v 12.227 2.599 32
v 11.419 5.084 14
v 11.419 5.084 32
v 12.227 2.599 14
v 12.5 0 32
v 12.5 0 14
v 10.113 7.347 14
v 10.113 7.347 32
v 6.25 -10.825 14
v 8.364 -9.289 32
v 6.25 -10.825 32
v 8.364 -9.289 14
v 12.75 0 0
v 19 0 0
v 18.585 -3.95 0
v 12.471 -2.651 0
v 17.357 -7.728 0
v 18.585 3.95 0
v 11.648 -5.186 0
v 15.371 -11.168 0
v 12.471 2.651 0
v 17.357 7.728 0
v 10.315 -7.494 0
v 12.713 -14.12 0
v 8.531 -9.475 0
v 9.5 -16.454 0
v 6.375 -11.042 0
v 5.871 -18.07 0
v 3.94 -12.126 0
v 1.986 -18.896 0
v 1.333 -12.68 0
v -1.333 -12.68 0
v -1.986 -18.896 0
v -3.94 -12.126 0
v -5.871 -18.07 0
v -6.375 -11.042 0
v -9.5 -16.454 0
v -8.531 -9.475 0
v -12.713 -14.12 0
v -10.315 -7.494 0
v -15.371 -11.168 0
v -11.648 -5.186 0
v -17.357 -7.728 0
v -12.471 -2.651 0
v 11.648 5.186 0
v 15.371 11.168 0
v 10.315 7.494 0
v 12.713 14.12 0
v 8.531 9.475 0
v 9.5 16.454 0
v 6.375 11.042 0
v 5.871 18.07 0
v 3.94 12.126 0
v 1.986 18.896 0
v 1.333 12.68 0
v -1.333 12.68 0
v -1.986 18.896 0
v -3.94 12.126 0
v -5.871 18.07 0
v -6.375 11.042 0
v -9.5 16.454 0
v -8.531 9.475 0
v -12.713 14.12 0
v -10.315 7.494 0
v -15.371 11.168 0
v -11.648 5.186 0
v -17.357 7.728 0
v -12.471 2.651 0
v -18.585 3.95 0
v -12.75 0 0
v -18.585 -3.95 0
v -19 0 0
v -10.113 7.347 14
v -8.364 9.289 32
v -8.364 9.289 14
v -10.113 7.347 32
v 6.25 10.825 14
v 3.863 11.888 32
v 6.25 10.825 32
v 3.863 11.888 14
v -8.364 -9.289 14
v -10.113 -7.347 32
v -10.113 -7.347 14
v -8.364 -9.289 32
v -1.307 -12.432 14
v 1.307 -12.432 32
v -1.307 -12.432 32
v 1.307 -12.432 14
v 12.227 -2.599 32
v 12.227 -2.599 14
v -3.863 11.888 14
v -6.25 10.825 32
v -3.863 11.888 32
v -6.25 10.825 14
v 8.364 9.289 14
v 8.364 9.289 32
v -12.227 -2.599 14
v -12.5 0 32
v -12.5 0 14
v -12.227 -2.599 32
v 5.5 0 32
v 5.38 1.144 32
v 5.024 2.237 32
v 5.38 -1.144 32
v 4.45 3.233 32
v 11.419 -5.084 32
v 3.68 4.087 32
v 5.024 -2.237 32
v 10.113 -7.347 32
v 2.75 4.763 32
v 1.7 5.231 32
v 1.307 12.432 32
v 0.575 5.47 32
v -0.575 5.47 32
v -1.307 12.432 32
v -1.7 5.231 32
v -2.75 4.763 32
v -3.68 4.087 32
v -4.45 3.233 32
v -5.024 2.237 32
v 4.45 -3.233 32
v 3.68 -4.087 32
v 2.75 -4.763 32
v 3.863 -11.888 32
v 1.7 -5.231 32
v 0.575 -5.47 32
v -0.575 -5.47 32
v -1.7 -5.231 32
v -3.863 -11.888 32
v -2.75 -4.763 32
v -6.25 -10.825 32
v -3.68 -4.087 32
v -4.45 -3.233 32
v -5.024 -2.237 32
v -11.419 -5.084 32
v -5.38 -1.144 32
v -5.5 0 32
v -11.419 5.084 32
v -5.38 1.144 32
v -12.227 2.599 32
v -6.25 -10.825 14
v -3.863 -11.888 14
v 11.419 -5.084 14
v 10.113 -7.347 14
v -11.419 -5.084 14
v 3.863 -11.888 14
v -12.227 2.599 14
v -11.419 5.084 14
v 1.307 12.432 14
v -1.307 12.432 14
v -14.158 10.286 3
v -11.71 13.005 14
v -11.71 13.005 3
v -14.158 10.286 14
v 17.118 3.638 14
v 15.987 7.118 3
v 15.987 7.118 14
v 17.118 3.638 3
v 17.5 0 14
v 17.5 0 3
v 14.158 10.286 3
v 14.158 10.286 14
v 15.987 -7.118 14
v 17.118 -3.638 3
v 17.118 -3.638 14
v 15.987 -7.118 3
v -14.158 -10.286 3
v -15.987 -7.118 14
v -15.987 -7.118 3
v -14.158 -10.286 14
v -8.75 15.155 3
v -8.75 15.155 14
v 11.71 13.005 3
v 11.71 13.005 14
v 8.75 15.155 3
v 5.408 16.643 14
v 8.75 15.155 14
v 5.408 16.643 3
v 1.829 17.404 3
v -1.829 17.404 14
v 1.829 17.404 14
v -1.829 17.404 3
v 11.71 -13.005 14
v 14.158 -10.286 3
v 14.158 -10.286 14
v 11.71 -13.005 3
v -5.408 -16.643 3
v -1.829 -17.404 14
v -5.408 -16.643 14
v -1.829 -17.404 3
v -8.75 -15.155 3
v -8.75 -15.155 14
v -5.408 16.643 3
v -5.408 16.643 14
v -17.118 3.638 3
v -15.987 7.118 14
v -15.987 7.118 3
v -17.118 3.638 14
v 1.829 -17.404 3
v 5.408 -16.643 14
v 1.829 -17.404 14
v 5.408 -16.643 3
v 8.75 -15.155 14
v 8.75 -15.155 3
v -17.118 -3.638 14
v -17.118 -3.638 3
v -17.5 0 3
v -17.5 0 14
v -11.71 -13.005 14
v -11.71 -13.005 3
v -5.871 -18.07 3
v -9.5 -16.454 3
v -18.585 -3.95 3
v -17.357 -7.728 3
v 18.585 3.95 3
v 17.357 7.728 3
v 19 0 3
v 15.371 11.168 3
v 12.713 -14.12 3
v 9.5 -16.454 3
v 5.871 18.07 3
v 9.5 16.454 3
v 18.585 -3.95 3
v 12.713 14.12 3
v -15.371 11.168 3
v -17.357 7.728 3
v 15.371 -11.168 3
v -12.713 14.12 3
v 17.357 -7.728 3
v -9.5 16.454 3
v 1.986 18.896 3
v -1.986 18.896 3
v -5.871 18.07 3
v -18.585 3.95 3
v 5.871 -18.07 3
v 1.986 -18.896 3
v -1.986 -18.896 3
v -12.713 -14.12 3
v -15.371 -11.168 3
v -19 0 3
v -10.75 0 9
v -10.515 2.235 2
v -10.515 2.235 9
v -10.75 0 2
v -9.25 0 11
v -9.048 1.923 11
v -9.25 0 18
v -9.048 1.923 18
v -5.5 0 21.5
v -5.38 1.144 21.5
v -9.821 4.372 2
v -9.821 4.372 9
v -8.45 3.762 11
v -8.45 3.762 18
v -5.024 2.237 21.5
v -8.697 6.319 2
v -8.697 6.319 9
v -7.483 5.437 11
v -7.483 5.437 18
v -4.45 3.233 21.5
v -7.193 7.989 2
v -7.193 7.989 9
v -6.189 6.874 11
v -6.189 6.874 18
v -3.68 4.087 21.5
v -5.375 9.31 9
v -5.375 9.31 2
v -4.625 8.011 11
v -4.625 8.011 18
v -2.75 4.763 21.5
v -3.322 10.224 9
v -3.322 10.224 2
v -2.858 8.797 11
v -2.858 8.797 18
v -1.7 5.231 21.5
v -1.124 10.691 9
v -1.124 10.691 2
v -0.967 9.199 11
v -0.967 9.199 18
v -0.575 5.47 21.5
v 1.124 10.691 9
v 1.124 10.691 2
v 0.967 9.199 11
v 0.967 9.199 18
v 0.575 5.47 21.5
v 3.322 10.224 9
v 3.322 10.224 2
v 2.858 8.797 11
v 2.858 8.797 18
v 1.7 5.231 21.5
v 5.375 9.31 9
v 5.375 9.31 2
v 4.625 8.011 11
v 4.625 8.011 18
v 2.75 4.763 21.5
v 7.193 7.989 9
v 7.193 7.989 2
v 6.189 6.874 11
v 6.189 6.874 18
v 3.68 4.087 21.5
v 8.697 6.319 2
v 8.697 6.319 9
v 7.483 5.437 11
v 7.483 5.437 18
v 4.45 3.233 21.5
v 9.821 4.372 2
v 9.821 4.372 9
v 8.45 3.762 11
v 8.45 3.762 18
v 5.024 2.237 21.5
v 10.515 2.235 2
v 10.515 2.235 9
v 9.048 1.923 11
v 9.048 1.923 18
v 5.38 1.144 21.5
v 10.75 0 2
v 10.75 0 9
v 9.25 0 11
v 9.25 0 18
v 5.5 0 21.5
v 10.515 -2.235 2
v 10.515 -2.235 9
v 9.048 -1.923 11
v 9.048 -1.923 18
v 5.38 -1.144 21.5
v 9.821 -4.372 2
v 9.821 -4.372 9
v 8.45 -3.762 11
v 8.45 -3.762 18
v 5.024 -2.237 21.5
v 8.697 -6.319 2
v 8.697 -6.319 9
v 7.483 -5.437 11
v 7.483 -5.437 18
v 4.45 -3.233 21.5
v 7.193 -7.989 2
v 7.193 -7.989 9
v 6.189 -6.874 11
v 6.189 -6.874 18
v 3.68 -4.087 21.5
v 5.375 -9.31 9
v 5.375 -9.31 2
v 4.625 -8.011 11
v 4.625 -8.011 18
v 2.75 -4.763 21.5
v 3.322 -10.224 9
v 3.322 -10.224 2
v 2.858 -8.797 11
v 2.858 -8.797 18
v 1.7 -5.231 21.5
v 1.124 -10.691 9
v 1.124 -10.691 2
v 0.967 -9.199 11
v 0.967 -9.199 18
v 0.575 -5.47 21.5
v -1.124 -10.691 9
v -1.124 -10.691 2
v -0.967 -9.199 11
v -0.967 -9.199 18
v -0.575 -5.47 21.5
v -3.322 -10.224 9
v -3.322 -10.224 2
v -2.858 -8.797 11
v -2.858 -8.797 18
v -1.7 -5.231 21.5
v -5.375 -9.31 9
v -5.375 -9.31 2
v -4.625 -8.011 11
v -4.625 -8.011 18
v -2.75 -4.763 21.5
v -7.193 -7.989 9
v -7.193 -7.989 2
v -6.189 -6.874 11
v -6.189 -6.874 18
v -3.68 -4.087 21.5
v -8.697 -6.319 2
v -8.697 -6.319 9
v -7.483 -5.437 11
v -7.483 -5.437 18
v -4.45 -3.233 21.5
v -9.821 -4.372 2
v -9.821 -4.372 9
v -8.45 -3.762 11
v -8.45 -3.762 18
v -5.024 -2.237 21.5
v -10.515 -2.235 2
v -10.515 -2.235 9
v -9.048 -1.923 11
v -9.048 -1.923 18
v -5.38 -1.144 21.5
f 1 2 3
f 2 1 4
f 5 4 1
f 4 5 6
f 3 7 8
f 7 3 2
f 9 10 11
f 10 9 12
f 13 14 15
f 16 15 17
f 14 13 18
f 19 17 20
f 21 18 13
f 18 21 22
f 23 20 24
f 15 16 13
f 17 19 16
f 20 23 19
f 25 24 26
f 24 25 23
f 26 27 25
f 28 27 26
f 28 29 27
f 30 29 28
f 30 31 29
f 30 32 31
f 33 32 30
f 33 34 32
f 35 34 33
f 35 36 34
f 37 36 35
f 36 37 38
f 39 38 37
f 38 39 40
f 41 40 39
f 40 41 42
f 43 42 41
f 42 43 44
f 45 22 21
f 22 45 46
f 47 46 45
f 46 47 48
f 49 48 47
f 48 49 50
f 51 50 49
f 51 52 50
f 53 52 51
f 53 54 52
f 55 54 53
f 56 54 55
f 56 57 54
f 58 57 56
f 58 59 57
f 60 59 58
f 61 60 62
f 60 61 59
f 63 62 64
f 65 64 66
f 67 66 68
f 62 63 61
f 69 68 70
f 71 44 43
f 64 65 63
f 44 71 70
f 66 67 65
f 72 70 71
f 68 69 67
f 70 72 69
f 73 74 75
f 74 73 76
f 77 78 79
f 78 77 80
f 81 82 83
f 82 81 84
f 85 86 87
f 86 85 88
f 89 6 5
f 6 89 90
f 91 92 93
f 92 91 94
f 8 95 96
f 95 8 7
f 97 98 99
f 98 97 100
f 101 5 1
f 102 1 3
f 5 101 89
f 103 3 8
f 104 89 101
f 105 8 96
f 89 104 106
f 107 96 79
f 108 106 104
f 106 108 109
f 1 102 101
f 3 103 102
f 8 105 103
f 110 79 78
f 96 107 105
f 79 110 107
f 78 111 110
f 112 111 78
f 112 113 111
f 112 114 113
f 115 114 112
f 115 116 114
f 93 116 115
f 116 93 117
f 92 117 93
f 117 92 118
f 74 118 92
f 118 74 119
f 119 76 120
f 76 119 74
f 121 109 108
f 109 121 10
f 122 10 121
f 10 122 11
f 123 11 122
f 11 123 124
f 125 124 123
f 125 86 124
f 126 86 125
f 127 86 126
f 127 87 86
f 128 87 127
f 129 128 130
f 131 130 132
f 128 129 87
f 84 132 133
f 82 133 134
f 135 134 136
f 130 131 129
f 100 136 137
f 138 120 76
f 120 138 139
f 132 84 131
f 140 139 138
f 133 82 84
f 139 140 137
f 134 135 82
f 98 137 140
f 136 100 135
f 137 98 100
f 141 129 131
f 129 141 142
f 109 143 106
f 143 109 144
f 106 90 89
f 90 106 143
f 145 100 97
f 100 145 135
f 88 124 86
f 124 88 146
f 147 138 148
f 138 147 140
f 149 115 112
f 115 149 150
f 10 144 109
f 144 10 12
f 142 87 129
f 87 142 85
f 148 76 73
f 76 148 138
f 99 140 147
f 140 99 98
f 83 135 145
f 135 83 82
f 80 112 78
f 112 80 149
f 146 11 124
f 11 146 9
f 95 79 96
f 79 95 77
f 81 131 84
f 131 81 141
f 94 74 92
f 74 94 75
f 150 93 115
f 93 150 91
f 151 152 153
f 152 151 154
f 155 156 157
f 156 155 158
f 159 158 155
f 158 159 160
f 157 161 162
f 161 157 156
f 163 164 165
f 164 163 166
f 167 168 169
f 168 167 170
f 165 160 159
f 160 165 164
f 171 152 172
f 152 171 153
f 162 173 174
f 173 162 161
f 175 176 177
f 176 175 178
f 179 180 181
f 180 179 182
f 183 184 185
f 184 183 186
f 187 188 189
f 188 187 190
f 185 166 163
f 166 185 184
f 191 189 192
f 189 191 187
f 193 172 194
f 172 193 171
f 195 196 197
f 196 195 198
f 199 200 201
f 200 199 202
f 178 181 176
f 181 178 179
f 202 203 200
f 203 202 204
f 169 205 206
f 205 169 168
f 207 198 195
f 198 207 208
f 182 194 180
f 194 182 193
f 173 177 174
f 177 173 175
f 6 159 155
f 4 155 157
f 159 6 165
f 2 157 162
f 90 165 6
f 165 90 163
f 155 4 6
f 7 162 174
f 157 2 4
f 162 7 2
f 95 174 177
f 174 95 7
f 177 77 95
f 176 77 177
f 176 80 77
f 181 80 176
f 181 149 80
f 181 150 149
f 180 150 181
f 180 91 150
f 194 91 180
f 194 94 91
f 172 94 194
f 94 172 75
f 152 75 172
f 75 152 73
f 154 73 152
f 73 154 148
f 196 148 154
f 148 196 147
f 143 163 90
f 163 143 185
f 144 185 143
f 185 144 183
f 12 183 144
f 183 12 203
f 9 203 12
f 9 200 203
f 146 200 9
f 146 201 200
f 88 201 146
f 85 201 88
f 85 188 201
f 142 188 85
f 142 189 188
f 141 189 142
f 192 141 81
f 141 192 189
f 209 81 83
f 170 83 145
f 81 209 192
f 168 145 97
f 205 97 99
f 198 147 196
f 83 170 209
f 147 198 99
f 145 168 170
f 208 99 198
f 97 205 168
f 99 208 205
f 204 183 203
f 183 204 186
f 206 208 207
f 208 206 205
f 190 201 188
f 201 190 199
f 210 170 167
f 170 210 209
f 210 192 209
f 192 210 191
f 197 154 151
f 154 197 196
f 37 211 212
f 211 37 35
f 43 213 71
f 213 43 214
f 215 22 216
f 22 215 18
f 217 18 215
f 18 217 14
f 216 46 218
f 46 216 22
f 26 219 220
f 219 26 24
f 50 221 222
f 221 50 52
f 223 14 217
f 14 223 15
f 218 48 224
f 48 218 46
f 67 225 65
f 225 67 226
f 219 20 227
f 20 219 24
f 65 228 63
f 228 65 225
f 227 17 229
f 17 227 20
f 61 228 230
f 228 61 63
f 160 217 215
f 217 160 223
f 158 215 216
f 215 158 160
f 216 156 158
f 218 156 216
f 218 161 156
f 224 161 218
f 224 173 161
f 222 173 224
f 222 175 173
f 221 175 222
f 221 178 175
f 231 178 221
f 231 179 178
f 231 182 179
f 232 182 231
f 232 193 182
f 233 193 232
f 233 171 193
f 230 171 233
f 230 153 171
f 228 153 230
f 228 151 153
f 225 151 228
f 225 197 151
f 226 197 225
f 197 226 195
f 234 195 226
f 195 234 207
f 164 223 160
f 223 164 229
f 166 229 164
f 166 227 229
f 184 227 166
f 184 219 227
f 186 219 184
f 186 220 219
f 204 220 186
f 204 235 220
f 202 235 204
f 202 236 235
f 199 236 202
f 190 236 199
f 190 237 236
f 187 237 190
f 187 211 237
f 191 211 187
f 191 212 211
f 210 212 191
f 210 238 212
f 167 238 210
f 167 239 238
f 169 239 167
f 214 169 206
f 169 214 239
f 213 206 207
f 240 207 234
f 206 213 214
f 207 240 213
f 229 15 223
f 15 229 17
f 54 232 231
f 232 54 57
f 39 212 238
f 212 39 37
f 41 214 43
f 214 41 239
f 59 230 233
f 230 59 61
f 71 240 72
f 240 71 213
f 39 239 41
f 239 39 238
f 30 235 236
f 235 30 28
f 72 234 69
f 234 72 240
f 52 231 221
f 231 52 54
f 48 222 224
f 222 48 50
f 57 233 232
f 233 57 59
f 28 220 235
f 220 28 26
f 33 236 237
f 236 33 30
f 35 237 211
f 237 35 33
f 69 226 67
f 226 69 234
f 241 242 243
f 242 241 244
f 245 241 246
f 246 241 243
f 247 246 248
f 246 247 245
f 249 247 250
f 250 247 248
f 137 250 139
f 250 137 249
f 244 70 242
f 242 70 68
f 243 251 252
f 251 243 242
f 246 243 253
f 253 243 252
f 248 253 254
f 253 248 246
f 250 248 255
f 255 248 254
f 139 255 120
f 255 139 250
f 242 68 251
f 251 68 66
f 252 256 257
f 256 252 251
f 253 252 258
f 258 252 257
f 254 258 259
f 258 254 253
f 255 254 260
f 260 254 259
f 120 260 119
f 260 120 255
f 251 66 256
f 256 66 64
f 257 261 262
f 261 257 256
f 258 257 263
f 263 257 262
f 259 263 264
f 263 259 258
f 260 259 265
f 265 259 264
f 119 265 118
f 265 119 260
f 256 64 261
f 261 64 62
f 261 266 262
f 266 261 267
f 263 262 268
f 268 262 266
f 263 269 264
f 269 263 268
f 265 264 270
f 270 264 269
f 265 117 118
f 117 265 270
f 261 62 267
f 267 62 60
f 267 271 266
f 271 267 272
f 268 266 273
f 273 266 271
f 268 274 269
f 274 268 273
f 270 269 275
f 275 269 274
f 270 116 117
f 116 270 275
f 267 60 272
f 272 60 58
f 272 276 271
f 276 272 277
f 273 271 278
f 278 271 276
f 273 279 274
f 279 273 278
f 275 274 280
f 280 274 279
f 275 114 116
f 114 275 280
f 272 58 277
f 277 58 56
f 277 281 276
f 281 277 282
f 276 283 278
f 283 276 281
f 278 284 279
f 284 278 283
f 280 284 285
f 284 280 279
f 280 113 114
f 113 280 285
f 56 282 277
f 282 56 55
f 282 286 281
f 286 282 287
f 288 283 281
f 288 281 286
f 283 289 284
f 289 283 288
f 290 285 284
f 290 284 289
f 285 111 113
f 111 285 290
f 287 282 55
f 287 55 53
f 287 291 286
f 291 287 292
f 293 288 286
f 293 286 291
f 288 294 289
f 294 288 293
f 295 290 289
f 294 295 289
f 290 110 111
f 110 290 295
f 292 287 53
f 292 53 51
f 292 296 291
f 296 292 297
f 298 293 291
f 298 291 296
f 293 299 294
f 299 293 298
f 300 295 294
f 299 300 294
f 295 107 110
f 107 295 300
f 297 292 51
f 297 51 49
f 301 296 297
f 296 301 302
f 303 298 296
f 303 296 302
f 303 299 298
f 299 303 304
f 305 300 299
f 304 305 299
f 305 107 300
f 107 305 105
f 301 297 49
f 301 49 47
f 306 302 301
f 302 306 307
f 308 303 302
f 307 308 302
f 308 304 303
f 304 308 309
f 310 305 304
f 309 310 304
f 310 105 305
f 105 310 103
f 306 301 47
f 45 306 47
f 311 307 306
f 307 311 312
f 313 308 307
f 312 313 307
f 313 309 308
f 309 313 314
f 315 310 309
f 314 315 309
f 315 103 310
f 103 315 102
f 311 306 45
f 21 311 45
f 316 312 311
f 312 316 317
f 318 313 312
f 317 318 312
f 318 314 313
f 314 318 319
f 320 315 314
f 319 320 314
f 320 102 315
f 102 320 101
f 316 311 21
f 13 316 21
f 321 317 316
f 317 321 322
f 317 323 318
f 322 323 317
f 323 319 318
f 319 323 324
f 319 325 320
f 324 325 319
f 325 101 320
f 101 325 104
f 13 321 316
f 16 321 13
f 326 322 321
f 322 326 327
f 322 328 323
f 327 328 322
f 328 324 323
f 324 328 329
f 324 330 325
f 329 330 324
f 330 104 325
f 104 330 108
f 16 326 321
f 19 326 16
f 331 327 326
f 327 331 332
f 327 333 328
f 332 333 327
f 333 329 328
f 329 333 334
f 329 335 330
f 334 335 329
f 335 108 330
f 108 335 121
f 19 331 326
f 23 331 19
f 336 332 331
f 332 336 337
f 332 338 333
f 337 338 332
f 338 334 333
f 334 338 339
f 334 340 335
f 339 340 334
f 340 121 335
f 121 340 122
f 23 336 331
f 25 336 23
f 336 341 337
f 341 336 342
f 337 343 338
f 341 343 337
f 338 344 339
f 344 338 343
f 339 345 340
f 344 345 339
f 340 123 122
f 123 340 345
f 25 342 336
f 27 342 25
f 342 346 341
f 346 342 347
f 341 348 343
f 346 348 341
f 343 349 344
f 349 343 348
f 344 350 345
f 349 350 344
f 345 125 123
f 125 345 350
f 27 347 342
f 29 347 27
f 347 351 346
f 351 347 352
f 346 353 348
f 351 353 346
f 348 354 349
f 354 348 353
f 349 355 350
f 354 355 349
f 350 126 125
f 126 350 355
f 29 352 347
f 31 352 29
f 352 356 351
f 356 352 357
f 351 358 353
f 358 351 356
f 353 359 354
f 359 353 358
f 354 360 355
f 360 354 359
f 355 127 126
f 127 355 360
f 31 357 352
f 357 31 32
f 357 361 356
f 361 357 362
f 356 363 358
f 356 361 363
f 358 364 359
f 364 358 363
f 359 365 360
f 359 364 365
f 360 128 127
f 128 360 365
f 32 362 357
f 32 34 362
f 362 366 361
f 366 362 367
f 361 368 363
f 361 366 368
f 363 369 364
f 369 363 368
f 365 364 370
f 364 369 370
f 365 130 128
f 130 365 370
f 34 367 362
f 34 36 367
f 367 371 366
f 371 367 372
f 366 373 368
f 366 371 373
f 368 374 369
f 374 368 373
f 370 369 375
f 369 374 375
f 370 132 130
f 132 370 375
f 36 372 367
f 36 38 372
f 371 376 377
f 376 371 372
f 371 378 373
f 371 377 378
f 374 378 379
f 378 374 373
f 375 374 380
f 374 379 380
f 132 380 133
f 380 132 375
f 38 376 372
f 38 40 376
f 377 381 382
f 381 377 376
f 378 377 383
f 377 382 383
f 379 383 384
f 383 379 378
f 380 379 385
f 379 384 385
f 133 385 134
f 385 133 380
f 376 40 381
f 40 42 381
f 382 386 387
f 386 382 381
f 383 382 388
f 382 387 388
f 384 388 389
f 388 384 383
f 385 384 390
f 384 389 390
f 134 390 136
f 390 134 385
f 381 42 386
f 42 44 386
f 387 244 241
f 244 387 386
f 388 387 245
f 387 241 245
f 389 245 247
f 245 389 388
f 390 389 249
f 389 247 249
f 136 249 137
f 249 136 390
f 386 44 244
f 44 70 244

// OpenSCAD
difference()
{
  union()
  {
    cylinder(d=25, h=32);
    cylinder(d=35, h=14);
    cylinder(d=38, h=3);
  }
  rotate_extrude(angle=360)
    polygon(points=[
      [0, 0],
      [0, 32],
      [11/2, 32],
      [11/2, 32-10.5],
      [18.5/2, 18],
      [18.5/2, 9+2],
      [21.5/2, 9],
      [21.5/2, 2],
      [21.5/2+2, 0]
      ]);
}
